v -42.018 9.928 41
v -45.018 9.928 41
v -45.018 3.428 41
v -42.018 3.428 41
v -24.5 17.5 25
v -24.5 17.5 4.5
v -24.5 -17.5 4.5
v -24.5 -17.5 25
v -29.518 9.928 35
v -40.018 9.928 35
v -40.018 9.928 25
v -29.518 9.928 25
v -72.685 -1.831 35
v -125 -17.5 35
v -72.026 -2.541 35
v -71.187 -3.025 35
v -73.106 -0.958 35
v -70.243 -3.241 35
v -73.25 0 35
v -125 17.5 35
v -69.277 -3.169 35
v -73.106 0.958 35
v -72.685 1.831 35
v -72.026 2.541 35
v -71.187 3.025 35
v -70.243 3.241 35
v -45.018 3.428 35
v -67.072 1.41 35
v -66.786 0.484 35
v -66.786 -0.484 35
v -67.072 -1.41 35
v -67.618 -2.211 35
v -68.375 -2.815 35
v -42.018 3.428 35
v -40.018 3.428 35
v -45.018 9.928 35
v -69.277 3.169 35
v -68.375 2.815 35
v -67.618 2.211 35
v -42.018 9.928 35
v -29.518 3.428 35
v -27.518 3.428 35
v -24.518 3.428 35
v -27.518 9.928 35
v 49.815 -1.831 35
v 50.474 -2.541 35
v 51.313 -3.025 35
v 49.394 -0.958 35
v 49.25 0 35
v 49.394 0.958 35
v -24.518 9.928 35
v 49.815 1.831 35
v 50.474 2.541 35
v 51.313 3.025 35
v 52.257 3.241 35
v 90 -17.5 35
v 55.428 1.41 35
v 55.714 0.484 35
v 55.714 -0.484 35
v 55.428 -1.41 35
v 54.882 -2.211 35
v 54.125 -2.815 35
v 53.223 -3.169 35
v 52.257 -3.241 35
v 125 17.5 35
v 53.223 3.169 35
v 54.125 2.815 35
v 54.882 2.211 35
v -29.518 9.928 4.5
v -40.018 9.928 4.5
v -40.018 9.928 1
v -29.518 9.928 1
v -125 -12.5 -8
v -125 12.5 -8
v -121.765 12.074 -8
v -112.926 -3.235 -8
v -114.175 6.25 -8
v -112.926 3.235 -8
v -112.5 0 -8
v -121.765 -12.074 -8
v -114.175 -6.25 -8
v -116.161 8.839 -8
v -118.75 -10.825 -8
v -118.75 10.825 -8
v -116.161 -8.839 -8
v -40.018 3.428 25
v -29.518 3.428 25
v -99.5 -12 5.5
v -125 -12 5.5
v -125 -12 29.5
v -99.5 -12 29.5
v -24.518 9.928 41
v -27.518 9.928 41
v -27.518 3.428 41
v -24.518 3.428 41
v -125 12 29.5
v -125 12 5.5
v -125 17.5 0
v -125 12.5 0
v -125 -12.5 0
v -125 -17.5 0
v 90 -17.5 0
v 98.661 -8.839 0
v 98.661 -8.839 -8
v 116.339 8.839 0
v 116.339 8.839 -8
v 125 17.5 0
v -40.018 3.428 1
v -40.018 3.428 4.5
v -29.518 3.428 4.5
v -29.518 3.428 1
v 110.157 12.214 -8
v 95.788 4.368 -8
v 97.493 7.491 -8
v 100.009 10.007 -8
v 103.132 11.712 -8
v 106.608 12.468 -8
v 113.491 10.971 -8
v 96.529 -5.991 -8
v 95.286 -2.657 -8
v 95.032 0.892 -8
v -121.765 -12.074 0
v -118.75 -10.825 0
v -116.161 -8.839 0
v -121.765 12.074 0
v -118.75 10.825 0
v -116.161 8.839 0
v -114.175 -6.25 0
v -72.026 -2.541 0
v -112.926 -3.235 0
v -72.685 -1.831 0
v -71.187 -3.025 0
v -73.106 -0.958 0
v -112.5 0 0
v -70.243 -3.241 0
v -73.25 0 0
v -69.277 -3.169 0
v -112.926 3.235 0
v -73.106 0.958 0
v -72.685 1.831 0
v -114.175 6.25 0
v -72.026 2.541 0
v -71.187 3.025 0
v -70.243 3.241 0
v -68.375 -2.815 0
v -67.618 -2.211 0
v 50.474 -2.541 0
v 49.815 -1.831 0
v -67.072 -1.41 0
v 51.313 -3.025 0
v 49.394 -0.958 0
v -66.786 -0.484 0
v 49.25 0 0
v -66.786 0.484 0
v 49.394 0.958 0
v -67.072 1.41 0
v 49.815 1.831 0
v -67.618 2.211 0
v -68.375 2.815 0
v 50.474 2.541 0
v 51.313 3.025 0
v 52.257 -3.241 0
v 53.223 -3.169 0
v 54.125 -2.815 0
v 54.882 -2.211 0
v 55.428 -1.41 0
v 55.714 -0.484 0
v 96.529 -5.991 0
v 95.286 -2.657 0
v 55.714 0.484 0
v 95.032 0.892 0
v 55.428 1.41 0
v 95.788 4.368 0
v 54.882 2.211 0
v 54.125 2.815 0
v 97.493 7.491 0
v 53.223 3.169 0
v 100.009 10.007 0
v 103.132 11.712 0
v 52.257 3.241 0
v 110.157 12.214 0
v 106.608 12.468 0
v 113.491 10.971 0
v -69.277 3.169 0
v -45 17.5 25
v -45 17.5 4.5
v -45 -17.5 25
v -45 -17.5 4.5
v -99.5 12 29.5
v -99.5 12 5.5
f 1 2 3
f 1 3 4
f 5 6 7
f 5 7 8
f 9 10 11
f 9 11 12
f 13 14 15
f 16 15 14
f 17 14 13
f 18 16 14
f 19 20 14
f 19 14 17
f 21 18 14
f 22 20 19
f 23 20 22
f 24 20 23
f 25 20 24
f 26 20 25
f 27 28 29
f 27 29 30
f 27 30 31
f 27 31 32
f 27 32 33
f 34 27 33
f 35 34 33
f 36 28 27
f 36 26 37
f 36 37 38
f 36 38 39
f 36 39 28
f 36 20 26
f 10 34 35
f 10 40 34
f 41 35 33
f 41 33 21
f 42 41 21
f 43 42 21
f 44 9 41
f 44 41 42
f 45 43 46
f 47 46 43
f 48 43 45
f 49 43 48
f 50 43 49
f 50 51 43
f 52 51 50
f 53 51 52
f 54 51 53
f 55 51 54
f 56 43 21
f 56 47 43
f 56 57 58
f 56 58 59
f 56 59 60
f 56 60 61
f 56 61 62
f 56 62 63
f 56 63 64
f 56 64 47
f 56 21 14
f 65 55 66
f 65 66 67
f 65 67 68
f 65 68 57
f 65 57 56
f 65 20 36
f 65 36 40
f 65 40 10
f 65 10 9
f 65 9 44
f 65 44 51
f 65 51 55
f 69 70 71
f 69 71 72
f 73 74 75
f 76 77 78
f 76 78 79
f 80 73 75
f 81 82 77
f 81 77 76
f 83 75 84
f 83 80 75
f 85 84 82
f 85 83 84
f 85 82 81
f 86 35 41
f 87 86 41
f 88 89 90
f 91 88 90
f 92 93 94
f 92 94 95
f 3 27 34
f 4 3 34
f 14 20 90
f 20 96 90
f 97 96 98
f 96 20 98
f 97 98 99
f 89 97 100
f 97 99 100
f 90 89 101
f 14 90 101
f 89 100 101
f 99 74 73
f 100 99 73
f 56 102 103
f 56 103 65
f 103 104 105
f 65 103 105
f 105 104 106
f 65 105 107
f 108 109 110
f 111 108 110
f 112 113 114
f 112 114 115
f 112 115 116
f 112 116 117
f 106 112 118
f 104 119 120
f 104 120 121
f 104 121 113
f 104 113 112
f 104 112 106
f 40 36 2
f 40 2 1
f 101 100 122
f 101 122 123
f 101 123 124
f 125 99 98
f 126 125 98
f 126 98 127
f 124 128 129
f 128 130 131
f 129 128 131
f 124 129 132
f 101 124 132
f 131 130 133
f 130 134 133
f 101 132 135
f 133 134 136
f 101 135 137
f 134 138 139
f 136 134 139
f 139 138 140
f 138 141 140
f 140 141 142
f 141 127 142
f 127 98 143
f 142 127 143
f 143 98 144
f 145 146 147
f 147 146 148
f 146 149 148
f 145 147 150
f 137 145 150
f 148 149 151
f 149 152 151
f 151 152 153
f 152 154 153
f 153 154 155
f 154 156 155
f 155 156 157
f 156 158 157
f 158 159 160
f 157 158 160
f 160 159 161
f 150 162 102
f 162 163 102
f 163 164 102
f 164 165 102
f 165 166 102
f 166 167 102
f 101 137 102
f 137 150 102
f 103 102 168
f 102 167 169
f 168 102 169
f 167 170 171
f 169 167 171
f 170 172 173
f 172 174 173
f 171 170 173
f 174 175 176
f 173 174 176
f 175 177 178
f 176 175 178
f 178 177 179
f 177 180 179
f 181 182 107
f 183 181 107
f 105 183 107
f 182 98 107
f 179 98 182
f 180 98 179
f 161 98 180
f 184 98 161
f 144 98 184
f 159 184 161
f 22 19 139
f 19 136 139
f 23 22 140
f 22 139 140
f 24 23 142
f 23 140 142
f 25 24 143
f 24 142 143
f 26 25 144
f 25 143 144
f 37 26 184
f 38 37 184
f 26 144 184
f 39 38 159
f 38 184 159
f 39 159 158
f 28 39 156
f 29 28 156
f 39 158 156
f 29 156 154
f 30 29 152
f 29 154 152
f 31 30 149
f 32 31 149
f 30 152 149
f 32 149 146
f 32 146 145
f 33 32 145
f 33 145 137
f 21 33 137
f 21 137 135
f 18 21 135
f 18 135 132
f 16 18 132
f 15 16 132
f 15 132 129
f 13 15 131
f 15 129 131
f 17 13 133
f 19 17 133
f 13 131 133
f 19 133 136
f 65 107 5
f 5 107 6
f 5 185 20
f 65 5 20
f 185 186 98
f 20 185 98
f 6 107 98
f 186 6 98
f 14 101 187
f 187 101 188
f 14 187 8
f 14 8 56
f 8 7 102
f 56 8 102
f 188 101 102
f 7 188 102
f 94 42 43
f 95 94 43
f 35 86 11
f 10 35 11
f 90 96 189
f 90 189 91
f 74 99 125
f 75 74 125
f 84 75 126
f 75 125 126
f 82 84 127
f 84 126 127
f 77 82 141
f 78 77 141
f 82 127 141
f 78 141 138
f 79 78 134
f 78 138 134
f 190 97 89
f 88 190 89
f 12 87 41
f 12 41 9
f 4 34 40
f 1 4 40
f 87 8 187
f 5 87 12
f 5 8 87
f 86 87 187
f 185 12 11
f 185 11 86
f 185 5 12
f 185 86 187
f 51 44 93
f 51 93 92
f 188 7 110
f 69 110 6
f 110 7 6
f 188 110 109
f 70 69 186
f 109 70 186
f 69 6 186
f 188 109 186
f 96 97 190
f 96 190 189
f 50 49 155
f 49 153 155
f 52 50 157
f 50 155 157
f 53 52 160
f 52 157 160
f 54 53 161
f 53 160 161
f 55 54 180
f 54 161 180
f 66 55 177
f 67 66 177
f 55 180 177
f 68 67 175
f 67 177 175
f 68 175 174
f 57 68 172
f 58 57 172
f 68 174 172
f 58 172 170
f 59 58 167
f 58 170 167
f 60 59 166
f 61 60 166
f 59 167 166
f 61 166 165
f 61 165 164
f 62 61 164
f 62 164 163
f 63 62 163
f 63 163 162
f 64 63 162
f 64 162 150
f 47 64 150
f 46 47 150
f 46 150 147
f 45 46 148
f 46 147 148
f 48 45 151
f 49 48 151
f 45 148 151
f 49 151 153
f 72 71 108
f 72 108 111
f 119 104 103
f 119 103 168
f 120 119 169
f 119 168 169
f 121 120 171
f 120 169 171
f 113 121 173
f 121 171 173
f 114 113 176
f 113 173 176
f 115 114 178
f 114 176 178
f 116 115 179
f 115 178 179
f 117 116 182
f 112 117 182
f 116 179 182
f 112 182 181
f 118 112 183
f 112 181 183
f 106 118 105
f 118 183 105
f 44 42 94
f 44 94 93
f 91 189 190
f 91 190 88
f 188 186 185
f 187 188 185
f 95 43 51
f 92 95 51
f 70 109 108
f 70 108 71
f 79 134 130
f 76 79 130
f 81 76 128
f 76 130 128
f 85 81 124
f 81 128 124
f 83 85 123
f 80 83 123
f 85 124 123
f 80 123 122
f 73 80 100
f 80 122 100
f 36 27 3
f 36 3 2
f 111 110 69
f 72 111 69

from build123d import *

# Parameters (mm, degrees)
F1_DEPTH  = 35
F3_D      = 6.5
F3_DEPTH  = 35
F3_TIP    = 1.9527970118
F4_D      = 6.5
F4_DEPTH  = 35
F4_TIP    = 1.9527970118
F6_W      = 24
F6_H      = 24
F7_DEPTH  = 25.5
F9_DEPTH  = 8
F11_DEPTH = 8
F12_W     = 20.5
F12_H     = 20.5
F13_DEPTH = 100
F14_W     = 10.5
F14_H     = 6.5
F16_DEPTH = 34
F15_W     = 3
F15_H     = 6.5
F17_DEPTH = 6


with BuildPart() as f1:
    # F0 (on Top) → F1 (new body)
    with BuildSketch(Plane.XY):
        Polygon((90, -17.5), (125, 17.5), (-125, 17.5), (-125, -17.5), align=None)
    extrude(amount=F1_DEPTH)

    # F3
    with Locations(Plane.XY.offset(35)):
        with Locations((-70, 0)):
            Hole(F3_D / 2, depth=F3_DEPTH)
            with Locations((0, 0, -(F3_DEPTH + F3_TIP / 2))):  # 118° drill point
                Cone(0, F3_D / 2, F3_TIP, mode=Mode.SUBTRACT)

    # F4
    with Locations(Plane.XY.offset(35)):
        with Locations((52.5, 0)):
            Hole(F4_D / 2, depth=F4_DEPTH)
            with Locations((0, 0, -(F4_DEPTH + F4_TIP / 2))):  # 118° drill point
                Cone(0, F4_D / 2, F4_TIP, mode=Mode.SUBTRACT)

    # F6 (on face) → F7 (cut)
    with BuildSketch(Plane(origin=(-125, 0, 0), x_dir=(0, -1, 0), z_dir=(-1, 0, 0))):
        with Locations((0, 17.5)):
            Rectangle(F6_W, F6_H)
    extrude(amount=-F7_DEPTH, mode=Mode.SUBTRACT)

    # F8 (on face) → F9 (join)
    with BuildSketch(Plane(origin=(0, 0, 0), x_dir=(1, 0, 0), z_dir=(0, 0, -1))):
        with BuildLine():
            Line((116.3388347648, -8.8388347648), (98.6611652352, 8.8388347648))
            ThreePointArc((98.6611652352, 8.8388347648), (98.6611652352, -8.8388347648), (116.3388347648, -8.8388347648))
        make_face()
    extrude(amount=F9_DEPTH)

    # F10 (on face) → F11 (join)
    with BuildSketch(Plane(origin=(0, 0, 0), x_dir=(1, 0, 0), z_dir=(0, 0, -1))):
        with BuildLine():
            ThreePointArc((-125, -12.5), (-116.1611652352, -8.8388347648), (-112.5, 0))
            ThreePointArc((-112.5, 0), (-116.1611652352, 8.8388347648), (-125, 12.5))
            Line((-125, 12.5), (-125, -12.5))
        make_face()
    extrude(amount=F11_DEPTH)

    # F12 (on face) → F13 (cut)
    with BuildSketch(Plane(origin=(0, 17.5, 0), x_dir=(-1, 0, 0), z_dir=(0, 1, 0))):
        with Locations((34.75, 14.75)):
            Rectangle(F12_W, F12_H)
    extrude(amount=-F13_DEPTH, mode=Mode.SUBTRACT)

    # F14 (on face) → F16 (cut)
    with BuildSketch(Plane.XY.offset(35)):
        with Locations((-34.7681139037, 6.6779768765)):
            Rectangle(F14_W, F14_H)
    extrude(amount=-F16_DEPTH, mode=Mode.SUBTRACT)

    # F15 (on face) → F17 (join)
    with BuildSketch(Plane.XY.offset(35)):
        with Locations((-43.5181139037, 6.6779768765)):
            Rectangle(F15_W, F15_H)
        with Locations((-26.0181139037, 6.6779768765)):
            Rectangle(F15_W, F15_H)
    extrude(amount=F17_DEPTH)


solid = f1.part
